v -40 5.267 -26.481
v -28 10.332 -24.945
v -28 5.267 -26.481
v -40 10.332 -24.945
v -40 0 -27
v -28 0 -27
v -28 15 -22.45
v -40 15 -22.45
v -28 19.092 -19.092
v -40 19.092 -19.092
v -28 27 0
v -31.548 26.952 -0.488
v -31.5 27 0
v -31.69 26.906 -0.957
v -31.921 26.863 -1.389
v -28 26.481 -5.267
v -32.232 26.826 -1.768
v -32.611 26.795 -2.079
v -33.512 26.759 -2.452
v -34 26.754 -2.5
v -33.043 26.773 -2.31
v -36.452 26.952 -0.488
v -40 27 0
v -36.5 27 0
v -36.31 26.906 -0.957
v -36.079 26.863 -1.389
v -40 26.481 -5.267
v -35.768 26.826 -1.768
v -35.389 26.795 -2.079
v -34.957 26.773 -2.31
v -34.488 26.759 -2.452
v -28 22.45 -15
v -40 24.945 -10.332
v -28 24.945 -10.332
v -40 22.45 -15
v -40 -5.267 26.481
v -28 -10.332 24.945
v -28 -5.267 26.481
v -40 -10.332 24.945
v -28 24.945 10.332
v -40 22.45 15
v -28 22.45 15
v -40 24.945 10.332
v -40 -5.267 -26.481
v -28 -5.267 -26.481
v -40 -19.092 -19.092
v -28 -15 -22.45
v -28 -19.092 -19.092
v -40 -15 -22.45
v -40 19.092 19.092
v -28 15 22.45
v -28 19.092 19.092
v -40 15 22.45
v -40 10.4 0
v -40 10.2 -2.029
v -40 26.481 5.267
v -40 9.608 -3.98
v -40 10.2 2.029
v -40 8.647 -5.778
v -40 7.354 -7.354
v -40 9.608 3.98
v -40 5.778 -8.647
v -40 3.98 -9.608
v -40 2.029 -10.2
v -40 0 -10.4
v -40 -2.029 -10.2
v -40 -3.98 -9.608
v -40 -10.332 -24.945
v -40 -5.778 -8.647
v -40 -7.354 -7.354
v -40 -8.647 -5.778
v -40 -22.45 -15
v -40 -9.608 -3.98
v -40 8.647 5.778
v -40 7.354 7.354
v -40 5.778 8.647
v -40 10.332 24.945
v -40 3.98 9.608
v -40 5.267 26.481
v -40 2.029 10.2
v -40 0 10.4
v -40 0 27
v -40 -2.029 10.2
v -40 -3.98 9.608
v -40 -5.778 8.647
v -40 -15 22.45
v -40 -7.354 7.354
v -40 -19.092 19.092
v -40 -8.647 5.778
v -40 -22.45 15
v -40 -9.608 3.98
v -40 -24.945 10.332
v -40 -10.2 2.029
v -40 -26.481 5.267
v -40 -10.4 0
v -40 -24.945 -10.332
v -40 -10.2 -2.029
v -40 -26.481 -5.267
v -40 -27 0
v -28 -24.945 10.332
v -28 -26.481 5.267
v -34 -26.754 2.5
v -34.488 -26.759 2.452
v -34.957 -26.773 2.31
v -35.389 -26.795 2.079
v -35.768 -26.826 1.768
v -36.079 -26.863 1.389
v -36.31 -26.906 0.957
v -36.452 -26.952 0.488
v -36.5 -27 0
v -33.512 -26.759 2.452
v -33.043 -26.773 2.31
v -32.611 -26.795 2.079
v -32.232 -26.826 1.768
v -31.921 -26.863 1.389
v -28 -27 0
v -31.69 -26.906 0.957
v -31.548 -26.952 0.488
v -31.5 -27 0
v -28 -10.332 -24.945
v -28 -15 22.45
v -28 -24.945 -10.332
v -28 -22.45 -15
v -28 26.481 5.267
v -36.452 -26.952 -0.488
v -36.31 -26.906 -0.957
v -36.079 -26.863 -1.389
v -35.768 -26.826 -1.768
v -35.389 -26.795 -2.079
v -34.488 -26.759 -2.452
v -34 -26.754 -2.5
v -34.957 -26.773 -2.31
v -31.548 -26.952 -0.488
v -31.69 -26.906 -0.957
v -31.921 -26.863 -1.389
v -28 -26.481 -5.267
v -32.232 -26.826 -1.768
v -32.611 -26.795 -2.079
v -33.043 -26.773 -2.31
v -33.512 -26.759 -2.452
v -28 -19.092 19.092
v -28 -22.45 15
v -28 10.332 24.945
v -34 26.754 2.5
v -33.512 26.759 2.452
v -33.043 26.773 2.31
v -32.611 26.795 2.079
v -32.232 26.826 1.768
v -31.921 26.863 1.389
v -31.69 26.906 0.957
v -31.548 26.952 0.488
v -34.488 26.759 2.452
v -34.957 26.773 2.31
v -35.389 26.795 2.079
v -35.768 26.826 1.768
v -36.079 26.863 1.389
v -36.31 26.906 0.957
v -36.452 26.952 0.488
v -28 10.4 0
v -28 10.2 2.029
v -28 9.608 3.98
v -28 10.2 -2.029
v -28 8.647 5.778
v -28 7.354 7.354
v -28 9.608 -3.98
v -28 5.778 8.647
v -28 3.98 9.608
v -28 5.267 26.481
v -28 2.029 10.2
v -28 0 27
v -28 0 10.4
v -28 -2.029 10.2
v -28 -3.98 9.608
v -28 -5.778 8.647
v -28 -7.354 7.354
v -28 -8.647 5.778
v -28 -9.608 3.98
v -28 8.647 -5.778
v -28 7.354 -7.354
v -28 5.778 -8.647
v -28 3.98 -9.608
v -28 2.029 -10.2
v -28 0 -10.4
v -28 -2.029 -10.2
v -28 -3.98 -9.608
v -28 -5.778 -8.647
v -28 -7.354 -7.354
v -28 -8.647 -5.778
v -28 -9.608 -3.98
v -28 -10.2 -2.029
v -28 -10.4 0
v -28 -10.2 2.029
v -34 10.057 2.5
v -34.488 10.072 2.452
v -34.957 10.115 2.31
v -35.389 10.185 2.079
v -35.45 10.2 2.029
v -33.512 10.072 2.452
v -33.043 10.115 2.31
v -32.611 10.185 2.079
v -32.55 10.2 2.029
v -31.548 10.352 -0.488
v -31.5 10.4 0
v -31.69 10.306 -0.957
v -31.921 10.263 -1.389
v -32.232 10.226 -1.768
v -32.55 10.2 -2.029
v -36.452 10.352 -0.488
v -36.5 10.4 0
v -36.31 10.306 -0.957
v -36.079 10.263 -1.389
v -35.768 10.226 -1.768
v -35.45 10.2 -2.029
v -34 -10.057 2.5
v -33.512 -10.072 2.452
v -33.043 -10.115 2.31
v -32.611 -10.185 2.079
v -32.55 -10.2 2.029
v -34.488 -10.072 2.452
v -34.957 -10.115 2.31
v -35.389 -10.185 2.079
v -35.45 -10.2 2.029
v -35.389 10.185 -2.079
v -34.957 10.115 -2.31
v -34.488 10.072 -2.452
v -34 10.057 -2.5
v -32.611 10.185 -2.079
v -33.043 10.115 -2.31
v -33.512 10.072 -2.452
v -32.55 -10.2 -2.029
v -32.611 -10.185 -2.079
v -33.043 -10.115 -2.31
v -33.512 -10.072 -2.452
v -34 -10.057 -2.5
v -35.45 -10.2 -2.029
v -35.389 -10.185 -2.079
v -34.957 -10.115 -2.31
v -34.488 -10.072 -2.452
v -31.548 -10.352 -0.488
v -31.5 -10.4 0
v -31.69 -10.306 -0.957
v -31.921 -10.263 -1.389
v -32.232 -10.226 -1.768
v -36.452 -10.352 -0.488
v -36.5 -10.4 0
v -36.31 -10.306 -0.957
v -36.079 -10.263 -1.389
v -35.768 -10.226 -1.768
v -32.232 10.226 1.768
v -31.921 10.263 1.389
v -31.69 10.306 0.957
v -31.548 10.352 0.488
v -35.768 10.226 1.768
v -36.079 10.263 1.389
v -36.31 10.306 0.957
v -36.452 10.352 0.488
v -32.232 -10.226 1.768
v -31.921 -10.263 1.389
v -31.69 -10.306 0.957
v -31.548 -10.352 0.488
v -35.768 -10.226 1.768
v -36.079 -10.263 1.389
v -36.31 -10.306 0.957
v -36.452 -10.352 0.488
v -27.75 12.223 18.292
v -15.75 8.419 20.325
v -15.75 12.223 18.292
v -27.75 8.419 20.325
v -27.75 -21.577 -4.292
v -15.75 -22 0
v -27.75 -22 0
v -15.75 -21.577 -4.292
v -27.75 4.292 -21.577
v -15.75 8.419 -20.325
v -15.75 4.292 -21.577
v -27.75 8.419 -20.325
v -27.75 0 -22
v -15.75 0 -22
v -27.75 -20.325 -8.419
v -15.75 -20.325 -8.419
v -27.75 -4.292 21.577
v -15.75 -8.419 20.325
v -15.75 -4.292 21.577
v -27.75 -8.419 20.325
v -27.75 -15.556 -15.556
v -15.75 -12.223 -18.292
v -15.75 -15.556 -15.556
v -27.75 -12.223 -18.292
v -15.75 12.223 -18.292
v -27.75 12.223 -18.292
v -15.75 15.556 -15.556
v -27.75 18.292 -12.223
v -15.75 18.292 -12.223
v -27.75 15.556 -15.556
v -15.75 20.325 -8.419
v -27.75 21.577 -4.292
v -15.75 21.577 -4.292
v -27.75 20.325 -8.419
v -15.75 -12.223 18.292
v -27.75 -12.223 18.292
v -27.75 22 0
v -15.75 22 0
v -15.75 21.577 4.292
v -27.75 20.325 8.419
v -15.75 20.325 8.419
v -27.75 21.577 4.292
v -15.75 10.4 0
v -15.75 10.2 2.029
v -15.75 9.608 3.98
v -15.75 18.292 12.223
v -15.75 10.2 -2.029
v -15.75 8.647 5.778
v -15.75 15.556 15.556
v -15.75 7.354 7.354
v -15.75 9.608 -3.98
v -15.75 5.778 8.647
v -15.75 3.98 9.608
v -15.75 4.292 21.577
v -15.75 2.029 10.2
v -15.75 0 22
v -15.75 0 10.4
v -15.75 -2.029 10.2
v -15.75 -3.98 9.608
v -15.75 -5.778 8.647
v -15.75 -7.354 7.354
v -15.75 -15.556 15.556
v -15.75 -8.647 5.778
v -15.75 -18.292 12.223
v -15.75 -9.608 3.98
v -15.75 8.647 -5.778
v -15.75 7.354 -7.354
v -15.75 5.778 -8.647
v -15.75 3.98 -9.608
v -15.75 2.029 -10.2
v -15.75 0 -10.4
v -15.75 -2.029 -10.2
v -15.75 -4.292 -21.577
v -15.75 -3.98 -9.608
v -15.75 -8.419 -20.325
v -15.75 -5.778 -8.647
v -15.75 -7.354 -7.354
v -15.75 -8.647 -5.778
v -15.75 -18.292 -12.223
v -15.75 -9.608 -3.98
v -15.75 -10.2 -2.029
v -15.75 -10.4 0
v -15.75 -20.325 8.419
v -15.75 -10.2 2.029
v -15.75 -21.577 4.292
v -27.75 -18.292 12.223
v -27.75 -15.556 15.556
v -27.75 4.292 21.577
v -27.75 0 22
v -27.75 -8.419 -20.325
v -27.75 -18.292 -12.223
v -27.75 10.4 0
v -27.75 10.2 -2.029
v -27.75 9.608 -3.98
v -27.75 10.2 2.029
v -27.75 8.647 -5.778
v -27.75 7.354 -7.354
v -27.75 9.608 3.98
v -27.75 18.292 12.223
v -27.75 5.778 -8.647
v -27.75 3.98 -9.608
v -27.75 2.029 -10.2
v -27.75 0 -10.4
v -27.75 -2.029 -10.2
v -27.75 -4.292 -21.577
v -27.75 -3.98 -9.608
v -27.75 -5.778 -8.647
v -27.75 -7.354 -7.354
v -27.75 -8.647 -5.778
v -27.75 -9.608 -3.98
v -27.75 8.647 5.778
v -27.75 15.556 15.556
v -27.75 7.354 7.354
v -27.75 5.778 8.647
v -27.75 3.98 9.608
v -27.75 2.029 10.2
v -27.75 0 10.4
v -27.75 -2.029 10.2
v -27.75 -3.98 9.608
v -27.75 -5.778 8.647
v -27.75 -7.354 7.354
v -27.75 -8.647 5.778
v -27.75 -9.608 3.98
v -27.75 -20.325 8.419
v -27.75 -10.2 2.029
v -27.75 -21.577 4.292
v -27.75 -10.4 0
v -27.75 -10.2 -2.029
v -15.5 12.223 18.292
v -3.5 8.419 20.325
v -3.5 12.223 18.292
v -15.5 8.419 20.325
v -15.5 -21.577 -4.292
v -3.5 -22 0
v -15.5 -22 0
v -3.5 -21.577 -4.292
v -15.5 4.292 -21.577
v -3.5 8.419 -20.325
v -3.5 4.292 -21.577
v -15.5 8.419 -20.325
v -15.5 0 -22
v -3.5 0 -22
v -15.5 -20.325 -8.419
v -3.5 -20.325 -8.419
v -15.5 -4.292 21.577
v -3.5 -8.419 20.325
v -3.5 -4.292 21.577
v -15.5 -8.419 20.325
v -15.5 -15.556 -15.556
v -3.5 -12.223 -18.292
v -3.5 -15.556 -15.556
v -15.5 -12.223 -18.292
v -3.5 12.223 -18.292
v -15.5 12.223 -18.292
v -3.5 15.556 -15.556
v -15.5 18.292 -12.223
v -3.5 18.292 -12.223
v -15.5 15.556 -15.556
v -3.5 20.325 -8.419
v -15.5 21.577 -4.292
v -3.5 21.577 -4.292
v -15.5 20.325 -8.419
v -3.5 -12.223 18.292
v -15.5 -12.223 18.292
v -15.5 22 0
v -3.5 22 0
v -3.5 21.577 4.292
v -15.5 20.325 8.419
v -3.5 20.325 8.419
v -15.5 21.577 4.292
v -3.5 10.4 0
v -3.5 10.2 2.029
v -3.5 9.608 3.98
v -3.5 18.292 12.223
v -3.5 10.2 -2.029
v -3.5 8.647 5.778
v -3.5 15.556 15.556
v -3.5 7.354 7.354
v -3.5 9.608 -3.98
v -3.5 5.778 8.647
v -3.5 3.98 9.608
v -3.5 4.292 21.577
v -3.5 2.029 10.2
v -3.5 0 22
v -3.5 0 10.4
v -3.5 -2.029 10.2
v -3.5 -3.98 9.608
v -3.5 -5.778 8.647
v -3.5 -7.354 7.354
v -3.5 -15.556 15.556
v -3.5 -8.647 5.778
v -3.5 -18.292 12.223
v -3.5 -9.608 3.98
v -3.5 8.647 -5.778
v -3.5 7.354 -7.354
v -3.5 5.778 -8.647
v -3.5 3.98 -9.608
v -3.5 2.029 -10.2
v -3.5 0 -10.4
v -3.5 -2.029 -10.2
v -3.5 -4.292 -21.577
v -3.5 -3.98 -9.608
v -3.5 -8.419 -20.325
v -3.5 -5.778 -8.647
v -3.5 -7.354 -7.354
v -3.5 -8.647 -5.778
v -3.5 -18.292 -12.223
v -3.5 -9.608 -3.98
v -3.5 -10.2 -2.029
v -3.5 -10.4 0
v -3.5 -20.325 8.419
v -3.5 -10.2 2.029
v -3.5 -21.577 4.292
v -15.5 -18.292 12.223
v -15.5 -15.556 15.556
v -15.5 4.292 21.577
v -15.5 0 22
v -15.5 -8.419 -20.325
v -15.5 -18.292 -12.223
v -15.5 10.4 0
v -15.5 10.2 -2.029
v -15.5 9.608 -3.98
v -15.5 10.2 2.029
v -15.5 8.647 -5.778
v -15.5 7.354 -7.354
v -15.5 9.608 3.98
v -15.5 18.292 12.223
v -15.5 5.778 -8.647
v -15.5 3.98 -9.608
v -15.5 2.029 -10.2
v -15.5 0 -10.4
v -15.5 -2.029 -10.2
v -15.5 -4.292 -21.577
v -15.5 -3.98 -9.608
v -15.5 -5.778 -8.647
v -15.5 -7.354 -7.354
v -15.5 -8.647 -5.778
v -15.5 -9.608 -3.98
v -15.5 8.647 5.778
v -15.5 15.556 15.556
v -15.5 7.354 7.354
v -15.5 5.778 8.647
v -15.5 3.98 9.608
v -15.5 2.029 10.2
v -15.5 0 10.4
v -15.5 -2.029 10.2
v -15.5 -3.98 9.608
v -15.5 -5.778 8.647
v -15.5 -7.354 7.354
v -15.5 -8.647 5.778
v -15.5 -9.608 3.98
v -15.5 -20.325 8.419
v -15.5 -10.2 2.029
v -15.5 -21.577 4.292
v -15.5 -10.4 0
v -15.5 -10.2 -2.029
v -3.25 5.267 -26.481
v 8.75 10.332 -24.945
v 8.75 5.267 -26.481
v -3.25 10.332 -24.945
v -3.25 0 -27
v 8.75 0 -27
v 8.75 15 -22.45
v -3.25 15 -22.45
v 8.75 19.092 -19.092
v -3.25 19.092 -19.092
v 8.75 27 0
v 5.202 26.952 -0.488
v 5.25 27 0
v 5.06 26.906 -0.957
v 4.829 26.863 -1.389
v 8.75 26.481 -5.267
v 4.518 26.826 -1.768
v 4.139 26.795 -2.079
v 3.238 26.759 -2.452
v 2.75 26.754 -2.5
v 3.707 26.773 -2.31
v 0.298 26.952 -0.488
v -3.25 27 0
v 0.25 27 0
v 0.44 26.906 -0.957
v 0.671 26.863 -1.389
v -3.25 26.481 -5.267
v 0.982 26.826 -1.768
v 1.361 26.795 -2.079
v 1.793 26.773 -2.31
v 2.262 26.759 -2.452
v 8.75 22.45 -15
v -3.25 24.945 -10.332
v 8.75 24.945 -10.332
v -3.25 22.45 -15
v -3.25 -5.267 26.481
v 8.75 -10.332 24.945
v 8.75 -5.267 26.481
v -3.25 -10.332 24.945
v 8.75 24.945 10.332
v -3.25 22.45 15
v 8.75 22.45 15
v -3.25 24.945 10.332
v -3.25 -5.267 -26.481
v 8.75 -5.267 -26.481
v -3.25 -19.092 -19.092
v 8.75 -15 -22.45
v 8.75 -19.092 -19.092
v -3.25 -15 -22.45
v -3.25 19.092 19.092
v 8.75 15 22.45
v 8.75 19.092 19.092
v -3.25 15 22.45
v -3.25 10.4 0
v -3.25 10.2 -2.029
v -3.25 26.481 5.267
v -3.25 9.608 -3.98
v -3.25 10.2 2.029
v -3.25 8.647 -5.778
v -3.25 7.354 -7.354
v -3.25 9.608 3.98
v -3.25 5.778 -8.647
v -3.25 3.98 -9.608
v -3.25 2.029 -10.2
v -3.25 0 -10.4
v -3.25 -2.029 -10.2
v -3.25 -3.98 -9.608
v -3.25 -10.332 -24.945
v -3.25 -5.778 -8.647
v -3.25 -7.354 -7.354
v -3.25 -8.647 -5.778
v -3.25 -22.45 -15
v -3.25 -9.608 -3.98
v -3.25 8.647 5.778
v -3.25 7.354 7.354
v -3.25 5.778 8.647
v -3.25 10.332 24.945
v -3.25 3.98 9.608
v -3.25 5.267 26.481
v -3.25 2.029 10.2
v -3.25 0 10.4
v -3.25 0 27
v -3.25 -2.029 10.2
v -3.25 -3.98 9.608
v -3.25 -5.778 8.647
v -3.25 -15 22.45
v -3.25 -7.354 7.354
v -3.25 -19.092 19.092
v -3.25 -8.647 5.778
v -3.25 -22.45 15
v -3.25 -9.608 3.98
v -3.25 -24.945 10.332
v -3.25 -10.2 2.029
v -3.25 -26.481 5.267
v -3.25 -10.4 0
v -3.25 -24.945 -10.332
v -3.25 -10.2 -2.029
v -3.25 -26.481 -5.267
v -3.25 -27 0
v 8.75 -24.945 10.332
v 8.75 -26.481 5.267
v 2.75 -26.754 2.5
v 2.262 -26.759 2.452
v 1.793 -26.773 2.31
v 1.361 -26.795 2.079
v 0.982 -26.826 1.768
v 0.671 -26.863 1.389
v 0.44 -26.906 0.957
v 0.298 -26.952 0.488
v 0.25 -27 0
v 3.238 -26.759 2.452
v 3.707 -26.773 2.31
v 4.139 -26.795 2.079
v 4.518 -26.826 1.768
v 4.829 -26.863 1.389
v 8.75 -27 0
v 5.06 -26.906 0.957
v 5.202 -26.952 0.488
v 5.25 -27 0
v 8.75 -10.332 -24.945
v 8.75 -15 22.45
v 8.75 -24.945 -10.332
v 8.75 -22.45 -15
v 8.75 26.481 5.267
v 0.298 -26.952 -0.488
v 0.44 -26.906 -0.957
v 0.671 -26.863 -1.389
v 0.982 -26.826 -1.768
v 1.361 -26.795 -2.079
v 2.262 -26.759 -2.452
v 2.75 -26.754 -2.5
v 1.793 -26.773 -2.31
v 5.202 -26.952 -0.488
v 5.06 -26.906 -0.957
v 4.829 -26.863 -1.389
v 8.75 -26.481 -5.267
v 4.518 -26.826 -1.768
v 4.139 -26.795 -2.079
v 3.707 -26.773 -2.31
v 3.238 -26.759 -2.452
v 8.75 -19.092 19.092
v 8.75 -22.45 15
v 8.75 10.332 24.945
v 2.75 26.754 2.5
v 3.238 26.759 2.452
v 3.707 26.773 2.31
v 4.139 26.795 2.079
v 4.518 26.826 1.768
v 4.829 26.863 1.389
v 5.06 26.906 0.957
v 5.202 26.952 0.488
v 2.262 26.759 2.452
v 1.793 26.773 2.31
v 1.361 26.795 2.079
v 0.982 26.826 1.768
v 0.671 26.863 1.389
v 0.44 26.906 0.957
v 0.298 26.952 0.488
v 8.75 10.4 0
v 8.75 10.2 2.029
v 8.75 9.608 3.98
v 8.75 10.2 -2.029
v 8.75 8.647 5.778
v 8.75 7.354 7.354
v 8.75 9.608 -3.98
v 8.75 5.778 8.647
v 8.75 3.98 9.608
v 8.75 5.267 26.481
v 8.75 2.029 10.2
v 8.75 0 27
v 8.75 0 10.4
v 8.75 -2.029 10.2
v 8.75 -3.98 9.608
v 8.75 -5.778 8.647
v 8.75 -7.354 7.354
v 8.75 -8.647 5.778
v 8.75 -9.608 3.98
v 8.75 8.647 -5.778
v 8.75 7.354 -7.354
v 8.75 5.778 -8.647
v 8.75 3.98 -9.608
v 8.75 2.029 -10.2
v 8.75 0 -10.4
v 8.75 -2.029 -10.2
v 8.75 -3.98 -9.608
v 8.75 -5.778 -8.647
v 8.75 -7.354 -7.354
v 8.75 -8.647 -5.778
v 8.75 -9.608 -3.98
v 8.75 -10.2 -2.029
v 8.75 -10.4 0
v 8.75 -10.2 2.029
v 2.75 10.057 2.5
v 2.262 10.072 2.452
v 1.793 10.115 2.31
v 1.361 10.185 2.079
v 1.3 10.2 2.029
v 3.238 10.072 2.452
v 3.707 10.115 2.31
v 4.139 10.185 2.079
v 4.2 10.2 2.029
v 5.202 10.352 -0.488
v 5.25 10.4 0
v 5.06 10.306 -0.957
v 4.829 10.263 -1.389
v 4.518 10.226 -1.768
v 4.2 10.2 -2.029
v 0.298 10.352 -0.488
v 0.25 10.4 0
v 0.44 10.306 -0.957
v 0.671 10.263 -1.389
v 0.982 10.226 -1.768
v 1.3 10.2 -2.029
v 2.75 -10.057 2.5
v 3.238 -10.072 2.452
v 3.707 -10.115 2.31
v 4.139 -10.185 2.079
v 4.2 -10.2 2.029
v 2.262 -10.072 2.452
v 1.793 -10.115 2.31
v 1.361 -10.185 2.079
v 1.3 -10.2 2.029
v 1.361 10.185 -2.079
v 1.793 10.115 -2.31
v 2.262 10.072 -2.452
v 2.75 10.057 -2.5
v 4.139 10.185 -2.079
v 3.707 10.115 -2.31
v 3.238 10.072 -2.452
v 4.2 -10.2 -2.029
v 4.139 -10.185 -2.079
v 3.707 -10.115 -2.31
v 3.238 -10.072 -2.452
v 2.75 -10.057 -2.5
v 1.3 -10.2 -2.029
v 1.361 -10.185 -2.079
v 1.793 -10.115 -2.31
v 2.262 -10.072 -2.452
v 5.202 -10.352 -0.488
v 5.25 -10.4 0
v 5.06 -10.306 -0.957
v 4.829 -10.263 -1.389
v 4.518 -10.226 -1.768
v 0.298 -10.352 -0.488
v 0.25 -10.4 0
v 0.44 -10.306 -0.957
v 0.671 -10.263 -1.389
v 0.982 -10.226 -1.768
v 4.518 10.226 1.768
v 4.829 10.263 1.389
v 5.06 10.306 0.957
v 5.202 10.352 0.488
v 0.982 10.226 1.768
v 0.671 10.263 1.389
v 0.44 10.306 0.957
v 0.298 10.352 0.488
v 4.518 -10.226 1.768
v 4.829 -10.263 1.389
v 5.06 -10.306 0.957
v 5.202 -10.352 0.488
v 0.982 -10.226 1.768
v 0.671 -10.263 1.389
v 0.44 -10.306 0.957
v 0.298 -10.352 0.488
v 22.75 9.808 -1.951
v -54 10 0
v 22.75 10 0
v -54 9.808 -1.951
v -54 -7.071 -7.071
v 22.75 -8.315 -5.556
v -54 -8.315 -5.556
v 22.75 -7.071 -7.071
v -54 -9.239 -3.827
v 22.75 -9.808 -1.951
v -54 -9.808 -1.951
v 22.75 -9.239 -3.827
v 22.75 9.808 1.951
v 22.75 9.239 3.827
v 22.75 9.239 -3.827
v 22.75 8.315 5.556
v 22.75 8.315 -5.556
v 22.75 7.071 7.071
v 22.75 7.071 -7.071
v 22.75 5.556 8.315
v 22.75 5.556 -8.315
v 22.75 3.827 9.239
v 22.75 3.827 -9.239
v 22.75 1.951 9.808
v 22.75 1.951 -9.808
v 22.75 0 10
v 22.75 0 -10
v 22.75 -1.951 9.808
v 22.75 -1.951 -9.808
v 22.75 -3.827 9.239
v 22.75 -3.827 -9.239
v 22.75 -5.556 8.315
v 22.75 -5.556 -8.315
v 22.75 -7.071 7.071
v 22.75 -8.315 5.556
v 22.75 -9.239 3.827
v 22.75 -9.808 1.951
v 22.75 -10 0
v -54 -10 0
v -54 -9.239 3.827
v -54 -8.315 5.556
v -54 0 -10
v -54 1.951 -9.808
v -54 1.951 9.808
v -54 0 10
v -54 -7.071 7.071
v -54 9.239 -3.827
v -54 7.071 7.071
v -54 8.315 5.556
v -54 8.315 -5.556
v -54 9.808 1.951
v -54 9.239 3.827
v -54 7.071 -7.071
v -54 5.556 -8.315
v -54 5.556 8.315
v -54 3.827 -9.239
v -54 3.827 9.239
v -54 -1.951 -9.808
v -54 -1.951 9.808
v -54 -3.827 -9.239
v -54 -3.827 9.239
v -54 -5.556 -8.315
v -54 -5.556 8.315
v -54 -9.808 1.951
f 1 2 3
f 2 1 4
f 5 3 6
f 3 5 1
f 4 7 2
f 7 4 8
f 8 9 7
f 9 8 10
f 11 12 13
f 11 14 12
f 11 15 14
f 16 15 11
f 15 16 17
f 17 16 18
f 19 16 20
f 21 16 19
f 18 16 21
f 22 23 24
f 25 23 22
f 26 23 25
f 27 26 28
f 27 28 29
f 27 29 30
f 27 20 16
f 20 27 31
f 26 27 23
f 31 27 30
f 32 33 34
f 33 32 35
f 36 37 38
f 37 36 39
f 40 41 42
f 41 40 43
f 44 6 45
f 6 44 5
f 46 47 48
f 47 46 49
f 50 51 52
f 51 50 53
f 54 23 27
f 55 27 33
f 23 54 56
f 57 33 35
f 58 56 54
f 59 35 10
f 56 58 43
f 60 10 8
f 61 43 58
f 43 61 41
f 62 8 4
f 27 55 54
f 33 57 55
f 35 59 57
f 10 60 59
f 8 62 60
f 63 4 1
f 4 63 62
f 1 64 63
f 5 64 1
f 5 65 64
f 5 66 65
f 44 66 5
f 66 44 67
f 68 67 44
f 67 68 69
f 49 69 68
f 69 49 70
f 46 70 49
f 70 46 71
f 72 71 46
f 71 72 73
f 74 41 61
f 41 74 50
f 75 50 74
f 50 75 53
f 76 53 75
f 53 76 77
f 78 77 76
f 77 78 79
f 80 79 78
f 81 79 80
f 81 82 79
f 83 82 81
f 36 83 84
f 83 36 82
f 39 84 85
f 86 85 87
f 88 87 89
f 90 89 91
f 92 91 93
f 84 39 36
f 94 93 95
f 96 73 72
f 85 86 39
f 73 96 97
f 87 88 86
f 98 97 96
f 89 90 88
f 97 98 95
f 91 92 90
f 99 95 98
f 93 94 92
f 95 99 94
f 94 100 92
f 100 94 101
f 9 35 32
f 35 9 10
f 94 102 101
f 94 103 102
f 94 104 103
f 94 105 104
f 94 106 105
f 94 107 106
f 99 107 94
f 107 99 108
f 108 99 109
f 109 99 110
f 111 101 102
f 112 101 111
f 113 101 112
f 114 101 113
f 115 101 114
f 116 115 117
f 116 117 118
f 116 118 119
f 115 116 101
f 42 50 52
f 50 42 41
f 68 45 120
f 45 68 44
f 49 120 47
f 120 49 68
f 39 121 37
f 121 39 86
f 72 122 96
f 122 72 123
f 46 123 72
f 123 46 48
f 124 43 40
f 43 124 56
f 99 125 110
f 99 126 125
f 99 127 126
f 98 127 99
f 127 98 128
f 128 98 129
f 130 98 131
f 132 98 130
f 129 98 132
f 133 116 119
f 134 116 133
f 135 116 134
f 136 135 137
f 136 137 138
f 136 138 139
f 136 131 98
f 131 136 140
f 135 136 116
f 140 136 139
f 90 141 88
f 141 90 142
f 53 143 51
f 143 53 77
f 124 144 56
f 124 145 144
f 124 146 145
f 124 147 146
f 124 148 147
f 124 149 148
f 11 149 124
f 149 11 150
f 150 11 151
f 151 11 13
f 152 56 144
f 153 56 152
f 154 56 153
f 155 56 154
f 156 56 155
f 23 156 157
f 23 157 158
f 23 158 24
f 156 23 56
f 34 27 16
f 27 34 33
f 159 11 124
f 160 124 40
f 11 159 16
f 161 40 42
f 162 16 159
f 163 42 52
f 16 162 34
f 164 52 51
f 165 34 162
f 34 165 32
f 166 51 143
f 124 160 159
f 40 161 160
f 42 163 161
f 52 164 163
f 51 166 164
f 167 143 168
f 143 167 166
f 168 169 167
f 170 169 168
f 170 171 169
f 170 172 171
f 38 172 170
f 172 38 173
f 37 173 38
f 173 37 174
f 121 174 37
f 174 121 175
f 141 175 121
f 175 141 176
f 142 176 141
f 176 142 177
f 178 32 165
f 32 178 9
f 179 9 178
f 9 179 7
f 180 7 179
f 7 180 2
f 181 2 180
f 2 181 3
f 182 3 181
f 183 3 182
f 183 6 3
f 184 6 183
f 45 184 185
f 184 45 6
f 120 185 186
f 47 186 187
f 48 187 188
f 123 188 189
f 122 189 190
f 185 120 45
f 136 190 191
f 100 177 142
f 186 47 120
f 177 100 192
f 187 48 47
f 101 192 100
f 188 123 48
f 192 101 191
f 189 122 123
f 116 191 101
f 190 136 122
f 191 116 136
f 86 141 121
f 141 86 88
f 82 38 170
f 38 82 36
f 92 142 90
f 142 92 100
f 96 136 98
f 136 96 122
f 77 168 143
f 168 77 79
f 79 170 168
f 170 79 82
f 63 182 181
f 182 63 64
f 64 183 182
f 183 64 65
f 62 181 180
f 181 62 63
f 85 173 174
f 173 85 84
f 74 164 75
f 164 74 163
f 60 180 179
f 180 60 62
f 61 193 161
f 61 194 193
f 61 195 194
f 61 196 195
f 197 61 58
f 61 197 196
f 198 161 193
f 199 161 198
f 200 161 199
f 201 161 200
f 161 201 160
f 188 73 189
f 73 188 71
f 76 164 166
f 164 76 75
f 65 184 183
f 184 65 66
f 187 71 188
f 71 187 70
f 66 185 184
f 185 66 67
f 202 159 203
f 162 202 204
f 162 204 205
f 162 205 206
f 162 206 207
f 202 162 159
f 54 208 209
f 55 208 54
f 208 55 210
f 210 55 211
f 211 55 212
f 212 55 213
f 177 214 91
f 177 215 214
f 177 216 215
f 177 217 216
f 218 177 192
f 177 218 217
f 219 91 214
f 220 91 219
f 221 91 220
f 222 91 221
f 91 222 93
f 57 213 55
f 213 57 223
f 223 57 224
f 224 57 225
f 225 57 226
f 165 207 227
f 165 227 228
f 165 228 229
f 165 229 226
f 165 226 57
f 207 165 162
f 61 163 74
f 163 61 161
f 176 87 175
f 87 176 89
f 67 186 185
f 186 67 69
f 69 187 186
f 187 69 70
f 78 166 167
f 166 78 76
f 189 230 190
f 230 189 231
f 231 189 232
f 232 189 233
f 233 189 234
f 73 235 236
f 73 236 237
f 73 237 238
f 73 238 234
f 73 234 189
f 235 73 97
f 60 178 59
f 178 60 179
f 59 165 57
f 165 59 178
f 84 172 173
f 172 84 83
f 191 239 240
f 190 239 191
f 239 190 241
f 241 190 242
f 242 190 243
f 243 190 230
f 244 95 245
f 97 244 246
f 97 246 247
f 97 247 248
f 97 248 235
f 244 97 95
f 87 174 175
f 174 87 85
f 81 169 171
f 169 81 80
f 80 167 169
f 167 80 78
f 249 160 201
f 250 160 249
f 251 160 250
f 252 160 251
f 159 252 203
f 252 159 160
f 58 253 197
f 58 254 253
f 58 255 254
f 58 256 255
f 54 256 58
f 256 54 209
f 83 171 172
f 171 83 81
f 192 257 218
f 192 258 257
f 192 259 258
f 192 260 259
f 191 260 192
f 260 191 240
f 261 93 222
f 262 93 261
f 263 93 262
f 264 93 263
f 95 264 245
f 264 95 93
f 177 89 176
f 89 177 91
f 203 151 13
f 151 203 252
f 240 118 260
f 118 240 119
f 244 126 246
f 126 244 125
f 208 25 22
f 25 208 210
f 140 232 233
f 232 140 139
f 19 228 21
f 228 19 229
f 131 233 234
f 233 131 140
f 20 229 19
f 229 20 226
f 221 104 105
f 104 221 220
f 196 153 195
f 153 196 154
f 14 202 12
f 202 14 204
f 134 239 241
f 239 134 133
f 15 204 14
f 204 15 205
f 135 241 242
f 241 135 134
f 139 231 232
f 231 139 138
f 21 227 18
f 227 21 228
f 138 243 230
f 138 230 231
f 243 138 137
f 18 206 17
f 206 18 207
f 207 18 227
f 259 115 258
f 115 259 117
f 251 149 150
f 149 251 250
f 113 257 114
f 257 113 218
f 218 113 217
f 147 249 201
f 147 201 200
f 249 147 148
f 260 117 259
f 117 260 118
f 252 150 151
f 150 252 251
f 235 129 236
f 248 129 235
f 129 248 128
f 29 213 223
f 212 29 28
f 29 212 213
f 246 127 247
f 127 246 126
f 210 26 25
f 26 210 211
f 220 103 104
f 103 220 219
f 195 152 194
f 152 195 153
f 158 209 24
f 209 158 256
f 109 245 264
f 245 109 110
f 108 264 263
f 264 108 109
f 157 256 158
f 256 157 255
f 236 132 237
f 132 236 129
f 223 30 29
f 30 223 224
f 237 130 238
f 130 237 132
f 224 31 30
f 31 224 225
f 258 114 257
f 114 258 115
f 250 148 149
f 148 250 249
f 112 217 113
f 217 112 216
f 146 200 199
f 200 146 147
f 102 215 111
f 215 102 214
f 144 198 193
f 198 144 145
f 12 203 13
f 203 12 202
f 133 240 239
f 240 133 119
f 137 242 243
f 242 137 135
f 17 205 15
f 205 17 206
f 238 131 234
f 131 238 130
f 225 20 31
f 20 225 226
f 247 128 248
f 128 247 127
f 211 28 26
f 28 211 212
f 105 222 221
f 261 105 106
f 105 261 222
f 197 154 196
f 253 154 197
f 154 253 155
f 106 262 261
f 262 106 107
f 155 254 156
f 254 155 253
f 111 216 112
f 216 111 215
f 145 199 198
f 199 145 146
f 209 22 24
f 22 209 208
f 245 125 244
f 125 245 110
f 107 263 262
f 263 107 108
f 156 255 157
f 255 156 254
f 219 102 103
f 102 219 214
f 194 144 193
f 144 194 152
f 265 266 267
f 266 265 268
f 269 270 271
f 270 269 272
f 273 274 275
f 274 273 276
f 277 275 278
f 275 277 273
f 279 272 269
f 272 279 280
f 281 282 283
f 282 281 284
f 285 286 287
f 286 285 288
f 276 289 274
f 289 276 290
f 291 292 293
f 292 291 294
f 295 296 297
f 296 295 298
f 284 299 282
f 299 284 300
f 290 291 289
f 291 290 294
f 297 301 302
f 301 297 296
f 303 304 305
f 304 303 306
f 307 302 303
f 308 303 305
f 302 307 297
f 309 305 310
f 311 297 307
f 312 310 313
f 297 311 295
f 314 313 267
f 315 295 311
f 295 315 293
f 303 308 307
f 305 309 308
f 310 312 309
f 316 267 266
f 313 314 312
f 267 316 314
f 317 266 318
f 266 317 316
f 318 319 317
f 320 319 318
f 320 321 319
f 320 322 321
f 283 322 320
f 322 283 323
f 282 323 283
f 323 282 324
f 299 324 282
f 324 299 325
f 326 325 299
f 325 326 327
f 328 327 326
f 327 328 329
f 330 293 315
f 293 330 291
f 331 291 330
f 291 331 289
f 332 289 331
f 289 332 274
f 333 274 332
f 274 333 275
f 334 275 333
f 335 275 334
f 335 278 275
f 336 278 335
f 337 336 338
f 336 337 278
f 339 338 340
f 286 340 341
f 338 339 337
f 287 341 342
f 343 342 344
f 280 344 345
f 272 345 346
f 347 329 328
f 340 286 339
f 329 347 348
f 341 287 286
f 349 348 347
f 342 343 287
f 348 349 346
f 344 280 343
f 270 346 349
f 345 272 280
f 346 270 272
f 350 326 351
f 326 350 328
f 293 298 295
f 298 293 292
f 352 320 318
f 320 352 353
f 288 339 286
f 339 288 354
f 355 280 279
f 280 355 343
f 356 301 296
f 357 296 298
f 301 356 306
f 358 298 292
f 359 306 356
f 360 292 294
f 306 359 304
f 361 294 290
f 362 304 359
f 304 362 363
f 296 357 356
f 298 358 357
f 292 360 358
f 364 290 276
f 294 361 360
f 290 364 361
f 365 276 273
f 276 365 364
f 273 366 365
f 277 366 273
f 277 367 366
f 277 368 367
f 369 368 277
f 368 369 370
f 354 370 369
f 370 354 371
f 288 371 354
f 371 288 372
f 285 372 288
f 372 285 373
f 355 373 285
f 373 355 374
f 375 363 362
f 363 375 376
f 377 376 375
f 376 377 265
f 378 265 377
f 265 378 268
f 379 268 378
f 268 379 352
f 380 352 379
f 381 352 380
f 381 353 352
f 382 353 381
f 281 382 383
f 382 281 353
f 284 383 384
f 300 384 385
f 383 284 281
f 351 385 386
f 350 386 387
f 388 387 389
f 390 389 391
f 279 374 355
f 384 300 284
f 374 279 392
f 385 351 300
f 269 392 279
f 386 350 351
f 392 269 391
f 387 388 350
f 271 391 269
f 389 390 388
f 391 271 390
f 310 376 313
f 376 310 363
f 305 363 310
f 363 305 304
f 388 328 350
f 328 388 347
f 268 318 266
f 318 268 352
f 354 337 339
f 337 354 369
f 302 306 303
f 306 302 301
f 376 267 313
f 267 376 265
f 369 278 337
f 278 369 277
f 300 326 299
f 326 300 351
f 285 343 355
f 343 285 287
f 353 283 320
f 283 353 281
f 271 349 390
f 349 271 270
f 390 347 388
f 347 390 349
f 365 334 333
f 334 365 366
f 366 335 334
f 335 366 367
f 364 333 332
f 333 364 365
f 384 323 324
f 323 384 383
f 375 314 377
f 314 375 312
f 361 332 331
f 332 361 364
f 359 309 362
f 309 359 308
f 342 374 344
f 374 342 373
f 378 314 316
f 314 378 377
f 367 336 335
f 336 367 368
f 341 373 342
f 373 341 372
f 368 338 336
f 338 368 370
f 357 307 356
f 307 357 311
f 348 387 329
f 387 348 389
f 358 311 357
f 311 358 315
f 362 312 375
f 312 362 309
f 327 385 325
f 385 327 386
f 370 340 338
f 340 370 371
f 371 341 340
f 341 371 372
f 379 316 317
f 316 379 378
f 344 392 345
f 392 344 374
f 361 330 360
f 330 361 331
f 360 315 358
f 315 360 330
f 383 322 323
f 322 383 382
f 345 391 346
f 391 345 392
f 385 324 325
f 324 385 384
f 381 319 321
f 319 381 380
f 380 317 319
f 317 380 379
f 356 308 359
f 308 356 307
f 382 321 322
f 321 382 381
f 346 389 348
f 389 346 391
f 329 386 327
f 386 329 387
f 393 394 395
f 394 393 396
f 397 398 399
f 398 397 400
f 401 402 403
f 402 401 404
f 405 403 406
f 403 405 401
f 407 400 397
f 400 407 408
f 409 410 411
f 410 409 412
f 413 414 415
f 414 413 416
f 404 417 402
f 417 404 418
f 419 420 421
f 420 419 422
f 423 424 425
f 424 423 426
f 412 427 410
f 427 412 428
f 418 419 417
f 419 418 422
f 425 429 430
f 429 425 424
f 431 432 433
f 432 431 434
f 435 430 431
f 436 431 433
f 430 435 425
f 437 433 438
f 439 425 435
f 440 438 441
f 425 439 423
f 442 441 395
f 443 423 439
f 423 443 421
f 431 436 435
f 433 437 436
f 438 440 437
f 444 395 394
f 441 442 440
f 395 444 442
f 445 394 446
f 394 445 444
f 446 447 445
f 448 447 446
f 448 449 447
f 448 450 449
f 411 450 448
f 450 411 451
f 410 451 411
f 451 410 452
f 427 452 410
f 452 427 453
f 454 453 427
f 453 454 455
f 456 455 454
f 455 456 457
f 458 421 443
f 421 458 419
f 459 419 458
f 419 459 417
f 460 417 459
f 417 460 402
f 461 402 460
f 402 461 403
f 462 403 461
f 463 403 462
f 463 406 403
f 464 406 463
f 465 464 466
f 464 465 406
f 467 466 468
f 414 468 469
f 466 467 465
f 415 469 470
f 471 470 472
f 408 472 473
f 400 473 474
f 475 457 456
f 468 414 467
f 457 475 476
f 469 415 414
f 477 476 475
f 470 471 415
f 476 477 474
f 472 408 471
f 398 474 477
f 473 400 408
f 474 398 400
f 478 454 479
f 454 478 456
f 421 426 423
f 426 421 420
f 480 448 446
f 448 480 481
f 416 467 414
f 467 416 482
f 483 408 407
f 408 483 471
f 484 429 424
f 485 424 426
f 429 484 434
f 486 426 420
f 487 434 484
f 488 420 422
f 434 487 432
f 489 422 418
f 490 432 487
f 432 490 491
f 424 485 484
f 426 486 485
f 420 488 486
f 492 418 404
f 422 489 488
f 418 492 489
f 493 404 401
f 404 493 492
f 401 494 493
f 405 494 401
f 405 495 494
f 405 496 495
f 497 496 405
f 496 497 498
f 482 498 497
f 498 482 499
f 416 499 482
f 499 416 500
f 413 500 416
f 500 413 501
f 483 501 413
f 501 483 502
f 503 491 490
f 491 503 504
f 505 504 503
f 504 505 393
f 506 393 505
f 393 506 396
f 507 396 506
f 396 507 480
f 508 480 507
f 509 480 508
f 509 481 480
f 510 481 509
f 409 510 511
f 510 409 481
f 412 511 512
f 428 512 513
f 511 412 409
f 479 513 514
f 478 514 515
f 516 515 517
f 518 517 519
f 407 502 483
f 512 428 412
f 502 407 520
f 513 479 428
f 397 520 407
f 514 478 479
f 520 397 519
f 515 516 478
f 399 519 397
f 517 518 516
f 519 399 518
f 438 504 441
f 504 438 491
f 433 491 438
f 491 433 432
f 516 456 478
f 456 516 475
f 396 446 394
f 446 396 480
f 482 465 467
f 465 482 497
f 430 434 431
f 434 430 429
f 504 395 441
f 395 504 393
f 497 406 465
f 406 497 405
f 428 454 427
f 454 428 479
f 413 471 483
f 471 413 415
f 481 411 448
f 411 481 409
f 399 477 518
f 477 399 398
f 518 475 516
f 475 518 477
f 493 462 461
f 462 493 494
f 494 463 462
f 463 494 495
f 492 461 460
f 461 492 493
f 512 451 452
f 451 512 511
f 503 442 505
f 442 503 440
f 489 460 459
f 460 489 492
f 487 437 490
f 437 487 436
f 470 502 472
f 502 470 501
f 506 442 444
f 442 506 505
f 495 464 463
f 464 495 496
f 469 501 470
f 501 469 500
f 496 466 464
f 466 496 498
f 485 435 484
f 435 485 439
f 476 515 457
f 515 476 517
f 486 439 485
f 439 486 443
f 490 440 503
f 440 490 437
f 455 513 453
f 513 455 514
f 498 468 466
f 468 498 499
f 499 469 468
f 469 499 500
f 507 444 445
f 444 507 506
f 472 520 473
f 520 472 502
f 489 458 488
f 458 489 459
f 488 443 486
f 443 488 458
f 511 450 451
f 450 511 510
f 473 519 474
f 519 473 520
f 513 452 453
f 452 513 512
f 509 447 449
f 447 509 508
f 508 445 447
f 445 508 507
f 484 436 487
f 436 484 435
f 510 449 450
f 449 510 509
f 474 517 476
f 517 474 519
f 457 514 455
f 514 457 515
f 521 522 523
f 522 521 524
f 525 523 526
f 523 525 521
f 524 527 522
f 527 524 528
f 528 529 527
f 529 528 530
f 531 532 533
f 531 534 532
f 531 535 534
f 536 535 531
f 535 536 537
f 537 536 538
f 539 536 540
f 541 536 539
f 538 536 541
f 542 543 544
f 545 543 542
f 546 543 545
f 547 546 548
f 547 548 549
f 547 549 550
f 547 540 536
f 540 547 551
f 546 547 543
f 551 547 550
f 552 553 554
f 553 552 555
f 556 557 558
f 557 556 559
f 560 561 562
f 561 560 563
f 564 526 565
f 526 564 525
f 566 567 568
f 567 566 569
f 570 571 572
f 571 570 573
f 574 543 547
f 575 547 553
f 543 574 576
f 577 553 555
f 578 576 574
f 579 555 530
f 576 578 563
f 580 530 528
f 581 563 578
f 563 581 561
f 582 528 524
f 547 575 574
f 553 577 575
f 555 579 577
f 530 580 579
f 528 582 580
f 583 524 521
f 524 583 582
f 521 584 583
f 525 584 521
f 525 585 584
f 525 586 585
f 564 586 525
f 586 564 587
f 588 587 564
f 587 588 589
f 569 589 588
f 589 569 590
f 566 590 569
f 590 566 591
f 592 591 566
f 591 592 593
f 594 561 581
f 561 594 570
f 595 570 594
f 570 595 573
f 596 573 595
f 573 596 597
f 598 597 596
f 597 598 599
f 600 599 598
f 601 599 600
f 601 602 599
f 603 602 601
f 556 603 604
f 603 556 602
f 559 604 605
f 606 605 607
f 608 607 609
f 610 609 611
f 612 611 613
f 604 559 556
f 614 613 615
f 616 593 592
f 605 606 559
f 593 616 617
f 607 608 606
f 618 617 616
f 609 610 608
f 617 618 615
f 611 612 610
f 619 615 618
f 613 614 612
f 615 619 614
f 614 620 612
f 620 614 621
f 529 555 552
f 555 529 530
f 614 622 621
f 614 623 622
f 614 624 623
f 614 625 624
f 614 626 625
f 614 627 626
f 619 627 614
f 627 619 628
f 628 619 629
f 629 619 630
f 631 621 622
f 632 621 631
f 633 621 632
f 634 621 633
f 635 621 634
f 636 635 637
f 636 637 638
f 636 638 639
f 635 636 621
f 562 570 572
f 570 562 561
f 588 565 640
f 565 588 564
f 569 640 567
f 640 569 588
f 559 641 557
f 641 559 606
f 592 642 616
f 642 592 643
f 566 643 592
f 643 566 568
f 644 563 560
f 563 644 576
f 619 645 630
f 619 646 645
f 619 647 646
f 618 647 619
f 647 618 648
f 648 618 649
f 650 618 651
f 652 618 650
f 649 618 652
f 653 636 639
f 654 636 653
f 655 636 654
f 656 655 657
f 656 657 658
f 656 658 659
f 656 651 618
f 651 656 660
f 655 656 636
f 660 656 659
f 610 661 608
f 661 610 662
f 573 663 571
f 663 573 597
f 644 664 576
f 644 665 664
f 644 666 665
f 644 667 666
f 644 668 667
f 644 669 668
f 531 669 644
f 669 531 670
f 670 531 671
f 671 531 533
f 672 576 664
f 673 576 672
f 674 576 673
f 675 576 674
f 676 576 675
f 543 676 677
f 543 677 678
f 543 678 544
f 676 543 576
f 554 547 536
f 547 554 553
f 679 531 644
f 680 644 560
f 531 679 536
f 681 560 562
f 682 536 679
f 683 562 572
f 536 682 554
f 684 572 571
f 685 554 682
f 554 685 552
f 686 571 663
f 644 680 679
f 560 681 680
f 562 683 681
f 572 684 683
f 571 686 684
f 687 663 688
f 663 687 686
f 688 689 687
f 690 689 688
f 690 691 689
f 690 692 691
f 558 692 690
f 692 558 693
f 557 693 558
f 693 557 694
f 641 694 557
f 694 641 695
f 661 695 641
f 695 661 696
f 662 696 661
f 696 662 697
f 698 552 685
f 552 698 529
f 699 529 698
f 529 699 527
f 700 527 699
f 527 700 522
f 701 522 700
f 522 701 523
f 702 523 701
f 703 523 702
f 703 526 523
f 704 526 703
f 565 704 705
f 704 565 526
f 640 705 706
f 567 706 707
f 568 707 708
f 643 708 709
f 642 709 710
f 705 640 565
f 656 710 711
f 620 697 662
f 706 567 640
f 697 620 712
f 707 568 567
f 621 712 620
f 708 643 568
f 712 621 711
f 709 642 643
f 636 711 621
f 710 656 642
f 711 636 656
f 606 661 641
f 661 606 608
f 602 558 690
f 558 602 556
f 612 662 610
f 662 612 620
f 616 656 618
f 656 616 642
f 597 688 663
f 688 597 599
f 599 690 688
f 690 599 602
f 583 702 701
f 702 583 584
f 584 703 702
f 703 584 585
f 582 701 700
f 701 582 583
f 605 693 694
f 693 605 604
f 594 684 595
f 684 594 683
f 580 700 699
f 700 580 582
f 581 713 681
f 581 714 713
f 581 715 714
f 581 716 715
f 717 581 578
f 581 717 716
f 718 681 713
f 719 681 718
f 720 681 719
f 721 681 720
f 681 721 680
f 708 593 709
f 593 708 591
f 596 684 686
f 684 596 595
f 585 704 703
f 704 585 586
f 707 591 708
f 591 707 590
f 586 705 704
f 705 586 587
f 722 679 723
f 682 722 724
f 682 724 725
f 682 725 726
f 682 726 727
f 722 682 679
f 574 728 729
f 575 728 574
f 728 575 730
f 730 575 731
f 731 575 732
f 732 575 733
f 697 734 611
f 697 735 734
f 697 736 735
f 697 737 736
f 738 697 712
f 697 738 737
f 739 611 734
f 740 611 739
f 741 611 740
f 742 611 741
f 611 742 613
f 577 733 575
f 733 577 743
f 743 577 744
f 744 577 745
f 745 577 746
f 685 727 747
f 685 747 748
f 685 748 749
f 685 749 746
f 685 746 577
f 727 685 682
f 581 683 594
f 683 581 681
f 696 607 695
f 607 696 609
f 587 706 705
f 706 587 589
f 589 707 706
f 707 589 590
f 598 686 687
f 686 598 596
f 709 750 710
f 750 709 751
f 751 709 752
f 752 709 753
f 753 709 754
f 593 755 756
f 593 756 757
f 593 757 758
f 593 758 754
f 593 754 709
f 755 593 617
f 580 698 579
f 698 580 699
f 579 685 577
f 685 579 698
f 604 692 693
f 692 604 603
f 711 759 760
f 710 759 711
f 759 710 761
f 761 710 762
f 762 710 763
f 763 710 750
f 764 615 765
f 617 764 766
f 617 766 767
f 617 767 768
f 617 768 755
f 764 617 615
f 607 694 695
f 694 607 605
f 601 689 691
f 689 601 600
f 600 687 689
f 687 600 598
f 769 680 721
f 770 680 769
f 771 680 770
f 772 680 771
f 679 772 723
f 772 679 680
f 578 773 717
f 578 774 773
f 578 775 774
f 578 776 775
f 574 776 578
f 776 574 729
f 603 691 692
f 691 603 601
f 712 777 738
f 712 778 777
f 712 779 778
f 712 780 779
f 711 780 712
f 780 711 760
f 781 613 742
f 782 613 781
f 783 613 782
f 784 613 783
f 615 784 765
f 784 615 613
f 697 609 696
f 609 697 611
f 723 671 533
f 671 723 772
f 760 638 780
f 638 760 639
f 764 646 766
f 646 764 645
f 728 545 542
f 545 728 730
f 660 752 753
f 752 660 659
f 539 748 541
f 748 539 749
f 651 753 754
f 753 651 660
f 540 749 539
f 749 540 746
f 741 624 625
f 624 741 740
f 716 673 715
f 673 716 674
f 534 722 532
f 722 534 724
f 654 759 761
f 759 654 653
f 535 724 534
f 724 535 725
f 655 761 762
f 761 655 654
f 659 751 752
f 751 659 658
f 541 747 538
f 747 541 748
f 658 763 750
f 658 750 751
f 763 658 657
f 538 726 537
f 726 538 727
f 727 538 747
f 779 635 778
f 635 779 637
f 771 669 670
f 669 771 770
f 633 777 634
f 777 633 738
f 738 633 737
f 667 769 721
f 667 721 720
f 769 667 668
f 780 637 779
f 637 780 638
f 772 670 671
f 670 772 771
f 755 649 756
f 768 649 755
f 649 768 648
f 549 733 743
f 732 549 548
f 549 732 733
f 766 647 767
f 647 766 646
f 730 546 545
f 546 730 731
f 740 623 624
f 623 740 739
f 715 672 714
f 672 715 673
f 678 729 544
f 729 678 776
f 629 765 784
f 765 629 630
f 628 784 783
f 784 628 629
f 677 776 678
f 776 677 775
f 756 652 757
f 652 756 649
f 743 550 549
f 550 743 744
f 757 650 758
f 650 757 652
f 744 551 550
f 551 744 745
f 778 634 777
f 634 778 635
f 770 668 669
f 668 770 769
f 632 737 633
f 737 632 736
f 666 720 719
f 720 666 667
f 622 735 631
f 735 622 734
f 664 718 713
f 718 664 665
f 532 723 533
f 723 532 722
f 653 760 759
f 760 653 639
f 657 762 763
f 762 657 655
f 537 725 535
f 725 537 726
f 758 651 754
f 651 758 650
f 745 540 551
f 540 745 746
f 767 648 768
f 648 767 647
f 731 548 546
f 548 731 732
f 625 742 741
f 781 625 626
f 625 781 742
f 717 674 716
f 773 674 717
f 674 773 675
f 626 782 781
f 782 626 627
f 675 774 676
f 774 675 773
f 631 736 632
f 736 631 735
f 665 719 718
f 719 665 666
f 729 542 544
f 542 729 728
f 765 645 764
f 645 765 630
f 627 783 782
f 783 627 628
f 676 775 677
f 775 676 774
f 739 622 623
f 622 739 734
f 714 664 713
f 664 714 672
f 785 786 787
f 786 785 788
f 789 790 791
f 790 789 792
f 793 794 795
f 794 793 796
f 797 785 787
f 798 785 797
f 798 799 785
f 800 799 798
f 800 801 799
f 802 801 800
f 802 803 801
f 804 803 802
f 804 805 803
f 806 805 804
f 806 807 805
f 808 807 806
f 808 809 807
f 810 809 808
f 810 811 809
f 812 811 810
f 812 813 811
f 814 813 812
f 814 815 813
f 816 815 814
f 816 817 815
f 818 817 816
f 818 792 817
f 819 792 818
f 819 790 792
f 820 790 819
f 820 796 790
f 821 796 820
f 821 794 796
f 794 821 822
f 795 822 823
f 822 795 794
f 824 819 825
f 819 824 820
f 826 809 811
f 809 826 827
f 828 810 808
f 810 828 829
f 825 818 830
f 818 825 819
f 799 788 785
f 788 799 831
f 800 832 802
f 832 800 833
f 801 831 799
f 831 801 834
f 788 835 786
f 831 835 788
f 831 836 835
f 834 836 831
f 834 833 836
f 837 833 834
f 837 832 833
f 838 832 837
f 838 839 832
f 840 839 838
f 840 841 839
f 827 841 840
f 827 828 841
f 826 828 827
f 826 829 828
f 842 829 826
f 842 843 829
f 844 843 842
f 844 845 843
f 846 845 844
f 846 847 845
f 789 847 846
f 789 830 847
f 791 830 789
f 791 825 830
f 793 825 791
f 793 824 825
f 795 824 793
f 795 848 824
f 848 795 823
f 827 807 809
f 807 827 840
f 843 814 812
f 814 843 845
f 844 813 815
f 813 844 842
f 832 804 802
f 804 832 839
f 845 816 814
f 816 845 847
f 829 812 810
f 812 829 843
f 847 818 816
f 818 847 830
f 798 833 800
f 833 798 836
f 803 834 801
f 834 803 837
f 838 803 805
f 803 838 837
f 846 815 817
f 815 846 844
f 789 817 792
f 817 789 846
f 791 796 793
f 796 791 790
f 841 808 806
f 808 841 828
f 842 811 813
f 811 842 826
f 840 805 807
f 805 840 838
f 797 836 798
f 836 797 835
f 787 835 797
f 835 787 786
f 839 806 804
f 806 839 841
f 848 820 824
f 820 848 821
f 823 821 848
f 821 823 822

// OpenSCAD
$fn = 32;

// ------------------------------------------------------------------------
// Shaft with rings and collars: d20 shaft, 4 rings
// Every part is its own module, assembly() places them once.
// ------------------------------------------------------------------------

// --- part 1 ---
module shaft() {
  translate([0, 0, -38.375]) cylinder(h = 76.75, d = 20);
}

// --- part 2 ---
module collar_a() {
  difference() {
    cylinder(h = 12, d = 54);
    translate([0, 0, -1]) cylinder(h = 14, d = 20.8);
    translate([0, 0, 6]) rotate([90, 0, 0]) cylinder(h = 56, d = 5, center = true);
  }
}

// --- part 3 ---
module spacer_a() {
  difference() {
      translate([0, 0, 0]) cylinder(h = 12, d = 44);
      translate([0, 0, -1]) cylinder(h = 14, d = 20.8);
    }
}

// --- part 4 ---
module spacer_b() {
  difference() {
      translate([0, 0, 0]) cylinder(h = 12, d = 44);
      translate([0, 0, -1]) cylinder(h = 14, d = 20.8);
    }
}

// --- part 5 ---
module collar_b() {
  difference() {
    cylinder(h = 12, d = 54);
    translate([0, 0, -1]) cylinder(h = 14, d = 20.8);
    translate([0, 0, 6]) rotate([90, 0, 0]) cylinder(h = 56, d = 5, center = true);
  }
}

// --- assembly ---
module assembly() {
  translate([-15.625, 0, 0]) rotate([0, 90, 0]) shaft();
  translate([-40, 0, 0]) rotate([0, 90, 0]) collar_a();
  translate([-27.75, 0, 0]) rotate([0, 90, 0]) spacer_a();
  translate([-15.5, 0, 0]) rotate([0, 90, 0]) spacer_b();
  translate([-3.25, 0, 0]) rotate([0, 90, 0]) collar_b();
}

assembly();
